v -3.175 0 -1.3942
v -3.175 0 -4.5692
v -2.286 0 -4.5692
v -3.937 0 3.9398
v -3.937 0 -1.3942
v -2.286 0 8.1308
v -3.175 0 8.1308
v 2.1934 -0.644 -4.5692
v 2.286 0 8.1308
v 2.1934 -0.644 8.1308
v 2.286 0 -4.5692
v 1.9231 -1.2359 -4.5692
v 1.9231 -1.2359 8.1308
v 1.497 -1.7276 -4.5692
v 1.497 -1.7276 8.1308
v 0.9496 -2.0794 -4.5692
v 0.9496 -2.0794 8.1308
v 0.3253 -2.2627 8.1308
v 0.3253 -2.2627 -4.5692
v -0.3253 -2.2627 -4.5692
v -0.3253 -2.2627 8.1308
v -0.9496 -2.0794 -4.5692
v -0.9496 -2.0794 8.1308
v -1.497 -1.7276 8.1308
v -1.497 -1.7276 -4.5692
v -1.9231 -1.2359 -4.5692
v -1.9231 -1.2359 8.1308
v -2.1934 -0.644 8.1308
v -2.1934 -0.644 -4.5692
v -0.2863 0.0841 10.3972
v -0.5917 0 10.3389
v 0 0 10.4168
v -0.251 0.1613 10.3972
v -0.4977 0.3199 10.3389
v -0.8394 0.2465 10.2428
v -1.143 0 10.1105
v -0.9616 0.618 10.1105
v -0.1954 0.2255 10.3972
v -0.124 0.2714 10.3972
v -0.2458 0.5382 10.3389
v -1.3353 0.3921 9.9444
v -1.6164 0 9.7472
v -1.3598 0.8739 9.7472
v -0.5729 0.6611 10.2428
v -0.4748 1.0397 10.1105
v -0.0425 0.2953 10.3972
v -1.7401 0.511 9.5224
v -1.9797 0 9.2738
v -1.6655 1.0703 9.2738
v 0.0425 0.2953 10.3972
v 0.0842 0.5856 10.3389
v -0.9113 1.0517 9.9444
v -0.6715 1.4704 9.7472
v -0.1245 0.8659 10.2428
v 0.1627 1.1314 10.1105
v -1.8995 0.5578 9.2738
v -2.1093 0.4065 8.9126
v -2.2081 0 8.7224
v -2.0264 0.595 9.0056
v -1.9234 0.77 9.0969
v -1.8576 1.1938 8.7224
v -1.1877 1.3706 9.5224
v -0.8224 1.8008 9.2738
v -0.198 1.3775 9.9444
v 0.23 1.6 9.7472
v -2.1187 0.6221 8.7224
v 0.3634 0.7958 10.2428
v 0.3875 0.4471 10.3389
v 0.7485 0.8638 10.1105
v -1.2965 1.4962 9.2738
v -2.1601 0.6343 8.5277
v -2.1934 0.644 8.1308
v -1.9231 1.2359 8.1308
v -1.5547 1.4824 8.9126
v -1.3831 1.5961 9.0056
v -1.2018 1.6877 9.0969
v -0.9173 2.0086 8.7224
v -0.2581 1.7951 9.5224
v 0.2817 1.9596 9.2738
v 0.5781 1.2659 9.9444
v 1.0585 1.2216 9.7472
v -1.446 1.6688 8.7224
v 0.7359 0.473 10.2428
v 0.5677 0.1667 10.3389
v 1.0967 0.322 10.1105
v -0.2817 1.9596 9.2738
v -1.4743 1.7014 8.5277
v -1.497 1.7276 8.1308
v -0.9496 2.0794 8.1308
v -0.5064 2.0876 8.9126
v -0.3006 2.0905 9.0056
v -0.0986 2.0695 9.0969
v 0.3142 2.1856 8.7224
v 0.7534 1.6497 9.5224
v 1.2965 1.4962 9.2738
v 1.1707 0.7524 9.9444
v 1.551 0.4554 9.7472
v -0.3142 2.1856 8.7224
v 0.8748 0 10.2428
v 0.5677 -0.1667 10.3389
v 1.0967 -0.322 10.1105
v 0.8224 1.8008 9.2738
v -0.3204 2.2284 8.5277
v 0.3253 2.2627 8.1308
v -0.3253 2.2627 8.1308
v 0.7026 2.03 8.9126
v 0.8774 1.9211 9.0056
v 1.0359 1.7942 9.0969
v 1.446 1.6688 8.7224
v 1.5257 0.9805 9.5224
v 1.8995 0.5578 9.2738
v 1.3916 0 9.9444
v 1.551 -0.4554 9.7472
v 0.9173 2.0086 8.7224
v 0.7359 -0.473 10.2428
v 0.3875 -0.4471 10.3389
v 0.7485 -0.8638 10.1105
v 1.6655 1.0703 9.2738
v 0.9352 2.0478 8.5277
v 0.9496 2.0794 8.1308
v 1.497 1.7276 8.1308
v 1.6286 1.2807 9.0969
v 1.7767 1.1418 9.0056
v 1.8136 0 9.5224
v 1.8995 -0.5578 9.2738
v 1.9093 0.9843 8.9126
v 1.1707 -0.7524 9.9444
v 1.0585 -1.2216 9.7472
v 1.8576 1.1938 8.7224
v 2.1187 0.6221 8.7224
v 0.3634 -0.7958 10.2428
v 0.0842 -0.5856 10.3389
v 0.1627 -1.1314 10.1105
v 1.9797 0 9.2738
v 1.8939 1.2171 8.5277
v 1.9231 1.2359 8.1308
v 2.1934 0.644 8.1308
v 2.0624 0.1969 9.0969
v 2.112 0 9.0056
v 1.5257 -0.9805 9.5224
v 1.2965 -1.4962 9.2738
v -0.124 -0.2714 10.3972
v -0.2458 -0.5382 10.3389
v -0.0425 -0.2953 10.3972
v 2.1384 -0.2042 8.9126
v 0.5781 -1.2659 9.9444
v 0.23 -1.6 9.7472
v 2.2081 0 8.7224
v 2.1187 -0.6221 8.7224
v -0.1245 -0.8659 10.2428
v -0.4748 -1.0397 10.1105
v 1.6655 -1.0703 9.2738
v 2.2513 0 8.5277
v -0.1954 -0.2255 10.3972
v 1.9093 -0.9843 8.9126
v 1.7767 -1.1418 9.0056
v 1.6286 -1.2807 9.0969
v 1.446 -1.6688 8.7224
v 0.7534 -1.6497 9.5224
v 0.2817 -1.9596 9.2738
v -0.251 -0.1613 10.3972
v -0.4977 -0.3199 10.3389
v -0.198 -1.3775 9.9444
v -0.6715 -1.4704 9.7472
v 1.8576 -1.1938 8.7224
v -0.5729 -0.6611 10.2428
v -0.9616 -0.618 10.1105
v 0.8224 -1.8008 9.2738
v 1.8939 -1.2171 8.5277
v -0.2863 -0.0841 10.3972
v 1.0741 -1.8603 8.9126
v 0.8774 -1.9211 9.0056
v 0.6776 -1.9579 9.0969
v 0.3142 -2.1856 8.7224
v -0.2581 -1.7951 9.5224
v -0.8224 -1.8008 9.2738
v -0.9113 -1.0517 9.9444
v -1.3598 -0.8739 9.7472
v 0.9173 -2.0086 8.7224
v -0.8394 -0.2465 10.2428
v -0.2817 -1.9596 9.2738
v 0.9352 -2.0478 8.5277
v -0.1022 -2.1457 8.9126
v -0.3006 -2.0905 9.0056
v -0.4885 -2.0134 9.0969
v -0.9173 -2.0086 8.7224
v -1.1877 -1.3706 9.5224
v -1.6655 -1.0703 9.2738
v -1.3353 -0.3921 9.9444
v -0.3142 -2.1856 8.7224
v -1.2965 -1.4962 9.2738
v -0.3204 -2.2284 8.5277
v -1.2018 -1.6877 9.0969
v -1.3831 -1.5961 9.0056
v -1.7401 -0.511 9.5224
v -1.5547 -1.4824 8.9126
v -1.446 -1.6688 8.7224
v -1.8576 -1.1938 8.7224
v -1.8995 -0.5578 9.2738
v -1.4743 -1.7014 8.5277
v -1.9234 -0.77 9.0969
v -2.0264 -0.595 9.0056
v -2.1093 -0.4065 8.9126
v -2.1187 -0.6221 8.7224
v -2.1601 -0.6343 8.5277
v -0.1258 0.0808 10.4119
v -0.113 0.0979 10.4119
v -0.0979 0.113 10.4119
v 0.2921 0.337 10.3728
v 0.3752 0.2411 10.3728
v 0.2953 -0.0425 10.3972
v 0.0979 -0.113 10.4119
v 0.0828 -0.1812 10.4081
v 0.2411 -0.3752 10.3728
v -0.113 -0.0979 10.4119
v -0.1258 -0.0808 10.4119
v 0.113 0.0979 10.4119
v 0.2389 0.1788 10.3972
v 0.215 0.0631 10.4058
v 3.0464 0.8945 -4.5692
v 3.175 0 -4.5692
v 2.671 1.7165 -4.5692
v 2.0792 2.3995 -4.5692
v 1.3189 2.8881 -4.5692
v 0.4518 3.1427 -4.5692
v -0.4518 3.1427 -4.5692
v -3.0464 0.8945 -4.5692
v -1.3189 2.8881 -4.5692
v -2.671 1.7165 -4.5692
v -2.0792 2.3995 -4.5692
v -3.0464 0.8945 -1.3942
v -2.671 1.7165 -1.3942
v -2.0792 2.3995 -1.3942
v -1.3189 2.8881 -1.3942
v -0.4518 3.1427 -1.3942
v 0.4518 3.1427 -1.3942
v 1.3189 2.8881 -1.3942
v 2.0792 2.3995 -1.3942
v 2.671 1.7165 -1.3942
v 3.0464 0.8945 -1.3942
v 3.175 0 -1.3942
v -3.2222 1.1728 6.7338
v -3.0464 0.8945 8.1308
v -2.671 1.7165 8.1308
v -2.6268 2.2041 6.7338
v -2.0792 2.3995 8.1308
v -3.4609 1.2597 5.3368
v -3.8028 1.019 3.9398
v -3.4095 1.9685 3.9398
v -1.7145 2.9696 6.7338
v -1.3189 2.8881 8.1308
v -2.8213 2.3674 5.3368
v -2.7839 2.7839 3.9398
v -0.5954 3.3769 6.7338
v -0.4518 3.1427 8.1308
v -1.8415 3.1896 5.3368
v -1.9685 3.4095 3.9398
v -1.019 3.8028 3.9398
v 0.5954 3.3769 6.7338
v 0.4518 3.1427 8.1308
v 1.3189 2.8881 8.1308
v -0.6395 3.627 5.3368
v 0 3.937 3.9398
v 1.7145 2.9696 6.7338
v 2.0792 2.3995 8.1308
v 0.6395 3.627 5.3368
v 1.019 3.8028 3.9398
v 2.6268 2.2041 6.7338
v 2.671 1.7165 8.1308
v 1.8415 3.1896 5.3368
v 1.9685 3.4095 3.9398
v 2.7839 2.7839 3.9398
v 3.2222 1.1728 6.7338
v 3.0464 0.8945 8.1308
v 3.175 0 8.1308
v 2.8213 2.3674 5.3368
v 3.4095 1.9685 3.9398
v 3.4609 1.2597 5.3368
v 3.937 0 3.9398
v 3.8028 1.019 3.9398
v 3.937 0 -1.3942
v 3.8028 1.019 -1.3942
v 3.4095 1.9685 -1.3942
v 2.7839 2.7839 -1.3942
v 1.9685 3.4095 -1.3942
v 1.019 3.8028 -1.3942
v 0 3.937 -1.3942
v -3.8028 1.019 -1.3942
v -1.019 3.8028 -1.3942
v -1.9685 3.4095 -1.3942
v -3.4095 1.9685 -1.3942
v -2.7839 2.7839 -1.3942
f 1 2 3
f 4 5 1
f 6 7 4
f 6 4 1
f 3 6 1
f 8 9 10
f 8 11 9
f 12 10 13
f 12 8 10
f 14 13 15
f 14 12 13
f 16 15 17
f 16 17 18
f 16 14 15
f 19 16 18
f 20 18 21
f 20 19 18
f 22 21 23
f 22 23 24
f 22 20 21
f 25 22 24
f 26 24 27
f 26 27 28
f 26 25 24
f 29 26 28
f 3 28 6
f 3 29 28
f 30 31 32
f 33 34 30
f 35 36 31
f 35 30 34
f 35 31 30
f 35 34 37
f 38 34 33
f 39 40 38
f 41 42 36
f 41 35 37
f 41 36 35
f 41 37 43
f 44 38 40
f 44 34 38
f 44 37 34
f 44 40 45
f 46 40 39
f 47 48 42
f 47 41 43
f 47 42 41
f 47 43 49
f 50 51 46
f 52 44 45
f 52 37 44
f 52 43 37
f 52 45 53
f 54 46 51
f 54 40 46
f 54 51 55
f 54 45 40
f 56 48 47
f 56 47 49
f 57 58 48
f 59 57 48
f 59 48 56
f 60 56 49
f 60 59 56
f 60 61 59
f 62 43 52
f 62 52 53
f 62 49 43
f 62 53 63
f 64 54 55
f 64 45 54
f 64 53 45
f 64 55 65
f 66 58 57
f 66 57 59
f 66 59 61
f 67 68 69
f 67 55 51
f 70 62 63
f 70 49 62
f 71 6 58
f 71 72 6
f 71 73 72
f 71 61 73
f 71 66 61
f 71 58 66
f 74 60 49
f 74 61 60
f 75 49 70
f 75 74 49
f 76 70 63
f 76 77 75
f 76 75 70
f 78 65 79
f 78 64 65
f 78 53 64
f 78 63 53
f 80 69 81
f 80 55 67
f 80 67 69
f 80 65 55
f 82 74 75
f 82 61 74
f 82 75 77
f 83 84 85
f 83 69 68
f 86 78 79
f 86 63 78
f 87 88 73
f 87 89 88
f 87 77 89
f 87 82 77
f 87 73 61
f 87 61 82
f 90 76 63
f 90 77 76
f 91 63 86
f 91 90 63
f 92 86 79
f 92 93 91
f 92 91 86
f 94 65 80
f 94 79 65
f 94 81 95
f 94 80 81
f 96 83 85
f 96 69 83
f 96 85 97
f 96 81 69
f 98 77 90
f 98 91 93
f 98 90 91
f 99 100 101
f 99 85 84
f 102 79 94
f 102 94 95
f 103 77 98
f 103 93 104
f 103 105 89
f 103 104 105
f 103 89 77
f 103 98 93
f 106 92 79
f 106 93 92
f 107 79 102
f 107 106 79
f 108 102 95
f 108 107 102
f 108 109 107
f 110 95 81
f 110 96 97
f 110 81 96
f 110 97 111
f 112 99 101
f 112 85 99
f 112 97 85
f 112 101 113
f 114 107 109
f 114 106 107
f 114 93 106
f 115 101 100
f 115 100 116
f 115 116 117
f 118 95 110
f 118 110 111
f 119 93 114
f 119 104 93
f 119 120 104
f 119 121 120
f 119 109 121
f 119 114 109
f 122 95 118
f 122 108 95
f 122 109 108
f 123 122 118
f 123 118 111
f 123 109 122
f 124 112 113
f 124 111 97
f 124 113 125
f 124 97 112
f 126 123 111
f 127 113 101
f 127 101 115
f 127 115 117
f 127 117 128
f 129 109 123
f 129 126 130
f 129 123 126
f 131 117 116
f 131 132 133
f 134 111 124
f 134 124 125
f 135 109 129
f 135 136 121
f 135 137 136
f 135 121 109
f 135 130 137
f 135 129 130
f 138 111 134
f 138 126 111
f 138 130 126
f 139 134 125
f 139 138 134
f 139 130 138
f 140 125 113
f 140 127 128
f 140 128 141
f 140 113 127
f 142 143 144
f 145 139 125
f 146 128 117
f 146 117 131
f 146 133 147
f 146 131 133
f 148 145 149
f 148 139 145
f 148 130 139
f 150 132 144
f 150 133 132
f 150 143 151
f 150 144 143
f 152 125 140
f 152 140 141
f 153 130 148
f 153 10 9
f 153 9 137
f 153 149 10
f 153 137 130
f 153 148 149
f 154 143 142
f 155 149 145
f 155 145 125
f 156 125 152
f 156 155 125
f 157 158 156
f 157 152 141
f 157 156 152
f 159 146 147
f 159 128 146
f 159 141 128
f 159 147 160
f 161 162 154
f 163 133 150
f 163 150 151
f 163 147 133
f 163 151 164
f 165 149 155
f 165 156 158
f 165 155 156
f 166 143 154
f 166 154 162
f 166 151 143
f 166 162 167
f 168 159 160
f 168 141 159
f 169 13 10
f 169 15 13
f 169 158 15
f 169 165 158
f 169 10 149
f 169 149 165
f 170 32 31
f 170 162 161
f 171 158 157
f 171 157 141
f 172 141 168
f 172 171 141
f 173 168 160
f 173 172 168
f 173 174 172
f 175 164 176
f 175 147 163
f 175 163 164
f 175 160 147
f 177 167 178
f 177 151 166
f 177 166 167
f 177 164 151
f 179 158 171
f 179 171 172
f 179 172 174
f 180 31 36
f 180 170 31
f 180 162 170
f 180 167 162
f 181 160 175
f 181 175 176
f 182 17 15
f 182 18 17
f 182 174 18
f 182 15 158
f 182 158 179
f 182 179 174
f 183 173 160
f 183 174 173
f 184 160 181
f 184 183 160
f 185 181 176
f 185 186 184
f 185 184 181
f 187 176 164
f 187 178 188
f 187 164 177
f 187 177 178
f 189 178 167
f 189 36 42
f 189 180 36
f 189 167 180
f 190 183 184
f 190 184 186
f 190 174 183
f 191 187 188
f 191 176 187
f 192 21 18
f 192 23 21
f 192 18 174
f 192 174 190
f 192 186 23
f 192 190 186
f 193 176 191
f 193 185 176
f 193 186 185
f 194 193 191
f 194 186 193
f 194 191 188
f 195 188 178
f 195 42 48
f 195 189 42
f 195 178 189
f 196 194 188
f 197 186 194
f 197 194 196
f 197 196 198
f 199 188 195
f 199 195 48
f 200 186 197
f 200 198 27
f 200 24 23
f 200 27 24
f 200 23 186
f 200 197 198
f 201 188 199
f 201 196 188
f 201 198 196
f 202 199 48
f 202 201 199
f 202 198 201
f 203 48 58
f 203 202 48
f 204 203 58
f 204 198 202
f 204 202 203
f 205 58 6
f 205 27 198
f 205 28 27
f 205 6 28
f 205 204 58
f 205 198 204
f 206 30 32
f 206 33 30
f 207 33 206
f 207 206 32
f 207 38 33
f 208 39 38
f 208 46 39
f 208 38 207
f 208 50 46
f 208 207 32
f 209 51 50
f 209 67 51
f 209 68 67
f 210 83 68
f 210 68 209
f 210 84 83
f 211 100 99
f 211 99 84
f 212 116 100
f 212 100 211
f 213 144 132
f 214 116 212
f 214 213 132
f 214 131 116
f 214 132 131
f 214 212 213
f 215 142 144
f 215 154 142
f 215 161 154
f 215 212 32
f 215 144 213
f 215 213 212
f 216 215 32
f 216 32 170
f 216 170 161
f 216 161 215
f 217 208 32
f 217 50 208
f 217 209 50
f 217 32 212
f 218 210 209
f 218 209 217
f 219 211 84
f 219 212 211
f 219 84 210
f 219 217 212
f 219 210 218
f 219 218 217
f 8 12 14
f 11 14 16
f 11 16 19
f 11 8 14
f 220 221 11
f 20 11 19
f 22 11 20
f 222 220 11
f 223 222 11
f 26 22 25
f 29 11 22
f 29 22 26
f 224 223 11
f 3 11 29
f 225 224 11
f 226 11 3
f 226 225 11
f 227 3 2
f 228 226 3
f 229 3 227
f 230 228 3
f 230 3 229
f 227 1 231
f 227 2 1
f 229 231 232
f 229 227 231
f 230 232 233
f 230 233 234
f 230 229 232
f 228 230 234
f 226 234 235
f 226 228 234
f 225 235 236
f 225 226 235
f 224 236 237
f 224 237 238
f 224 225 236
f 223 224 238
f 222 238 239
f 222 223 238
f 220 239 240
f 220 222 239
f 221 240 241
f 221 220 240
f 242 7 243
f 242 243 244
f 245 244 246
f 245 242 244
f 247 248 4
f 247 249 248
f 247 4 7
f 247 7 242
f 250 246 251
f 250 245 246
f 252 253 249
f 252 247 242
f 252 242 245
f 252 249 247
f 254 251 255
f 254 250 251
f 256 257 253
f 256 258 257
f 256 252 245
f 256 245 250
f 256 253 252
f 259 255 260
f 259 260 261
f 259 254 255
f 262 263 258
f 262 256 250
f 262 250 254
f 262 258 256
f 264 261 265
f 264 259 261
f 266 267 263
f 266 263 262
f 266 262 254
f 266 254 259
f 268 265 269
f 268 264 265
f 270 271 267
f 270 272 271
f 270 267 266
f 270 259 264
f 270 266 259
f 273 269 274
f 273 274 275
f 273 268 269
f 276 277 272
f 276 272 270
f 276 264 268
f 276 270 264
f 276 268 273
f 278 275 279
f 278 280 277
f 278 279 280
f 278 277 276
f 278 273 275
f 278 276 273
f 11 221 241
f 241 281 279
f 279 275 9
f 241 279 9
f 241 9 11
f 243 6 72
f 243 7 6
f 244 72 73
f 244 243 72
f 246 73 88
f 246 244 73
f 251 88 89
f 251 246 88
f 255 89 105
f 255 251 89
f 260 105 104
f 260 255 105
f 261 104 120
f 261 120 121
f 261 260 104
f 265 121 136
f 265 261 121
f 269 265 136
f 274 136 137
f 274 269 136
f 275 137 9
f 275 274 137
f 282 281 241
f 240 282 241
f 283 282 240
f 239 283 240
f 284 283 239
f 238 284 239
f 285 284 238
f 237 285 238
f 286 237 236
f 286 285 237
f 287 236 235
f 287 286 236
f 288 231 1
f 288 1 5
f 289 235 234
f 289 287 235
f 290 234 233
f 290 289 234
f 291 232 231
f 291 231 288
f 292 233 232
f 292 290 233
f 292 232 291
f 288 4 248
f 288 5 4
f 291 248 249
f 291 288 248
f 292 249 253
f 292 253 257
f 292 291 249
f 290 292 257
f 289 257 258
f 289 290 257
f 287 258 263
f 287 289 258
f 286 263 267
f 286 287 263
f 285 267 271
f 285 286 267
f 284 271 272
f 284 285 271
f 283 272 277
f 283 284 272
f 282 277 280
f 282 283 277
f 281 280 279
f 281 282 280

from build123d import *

# Parameters (mm, degrees)
F2_ANGLE = 180


with BuildPart() as f1:
    # F0 (on Front) → F1 (revolve)
    with BuildSketch(Plane.XZ):
        with BuildLine():
            ThreePointArc((0, 10.416769), (-1.616446, 9.747216), (-2.286, 8.130769))
            Line((-2.286, 8.130769), (-2.286, -4.569231))
            Line((-2.286, -4.569231), (0, -4.569231))
            Line((0, -4.569231), (0, 10.416769))
        make_face()
    revolve(axis=Axis((0, 0, 2.689288), (0, 0, -1)))

    # F0 (on Front) → F2 (revolve)
    with BuildSketch(Plane.XZ):
        Polygon((-2.286, -4.569231), (-2.286, 8.130769), (-3.175, 8.130817), (-3.937, 3.939769), (-3.937, -1.394231), (-3.175, -1.394231), (-3.175, -4.569231), align=None)
    revolve(axis=Axis((0, 0, 2.689288), (0, 0, -1)), revolution_arc=F2_ANGLE)


solid = f1.part
